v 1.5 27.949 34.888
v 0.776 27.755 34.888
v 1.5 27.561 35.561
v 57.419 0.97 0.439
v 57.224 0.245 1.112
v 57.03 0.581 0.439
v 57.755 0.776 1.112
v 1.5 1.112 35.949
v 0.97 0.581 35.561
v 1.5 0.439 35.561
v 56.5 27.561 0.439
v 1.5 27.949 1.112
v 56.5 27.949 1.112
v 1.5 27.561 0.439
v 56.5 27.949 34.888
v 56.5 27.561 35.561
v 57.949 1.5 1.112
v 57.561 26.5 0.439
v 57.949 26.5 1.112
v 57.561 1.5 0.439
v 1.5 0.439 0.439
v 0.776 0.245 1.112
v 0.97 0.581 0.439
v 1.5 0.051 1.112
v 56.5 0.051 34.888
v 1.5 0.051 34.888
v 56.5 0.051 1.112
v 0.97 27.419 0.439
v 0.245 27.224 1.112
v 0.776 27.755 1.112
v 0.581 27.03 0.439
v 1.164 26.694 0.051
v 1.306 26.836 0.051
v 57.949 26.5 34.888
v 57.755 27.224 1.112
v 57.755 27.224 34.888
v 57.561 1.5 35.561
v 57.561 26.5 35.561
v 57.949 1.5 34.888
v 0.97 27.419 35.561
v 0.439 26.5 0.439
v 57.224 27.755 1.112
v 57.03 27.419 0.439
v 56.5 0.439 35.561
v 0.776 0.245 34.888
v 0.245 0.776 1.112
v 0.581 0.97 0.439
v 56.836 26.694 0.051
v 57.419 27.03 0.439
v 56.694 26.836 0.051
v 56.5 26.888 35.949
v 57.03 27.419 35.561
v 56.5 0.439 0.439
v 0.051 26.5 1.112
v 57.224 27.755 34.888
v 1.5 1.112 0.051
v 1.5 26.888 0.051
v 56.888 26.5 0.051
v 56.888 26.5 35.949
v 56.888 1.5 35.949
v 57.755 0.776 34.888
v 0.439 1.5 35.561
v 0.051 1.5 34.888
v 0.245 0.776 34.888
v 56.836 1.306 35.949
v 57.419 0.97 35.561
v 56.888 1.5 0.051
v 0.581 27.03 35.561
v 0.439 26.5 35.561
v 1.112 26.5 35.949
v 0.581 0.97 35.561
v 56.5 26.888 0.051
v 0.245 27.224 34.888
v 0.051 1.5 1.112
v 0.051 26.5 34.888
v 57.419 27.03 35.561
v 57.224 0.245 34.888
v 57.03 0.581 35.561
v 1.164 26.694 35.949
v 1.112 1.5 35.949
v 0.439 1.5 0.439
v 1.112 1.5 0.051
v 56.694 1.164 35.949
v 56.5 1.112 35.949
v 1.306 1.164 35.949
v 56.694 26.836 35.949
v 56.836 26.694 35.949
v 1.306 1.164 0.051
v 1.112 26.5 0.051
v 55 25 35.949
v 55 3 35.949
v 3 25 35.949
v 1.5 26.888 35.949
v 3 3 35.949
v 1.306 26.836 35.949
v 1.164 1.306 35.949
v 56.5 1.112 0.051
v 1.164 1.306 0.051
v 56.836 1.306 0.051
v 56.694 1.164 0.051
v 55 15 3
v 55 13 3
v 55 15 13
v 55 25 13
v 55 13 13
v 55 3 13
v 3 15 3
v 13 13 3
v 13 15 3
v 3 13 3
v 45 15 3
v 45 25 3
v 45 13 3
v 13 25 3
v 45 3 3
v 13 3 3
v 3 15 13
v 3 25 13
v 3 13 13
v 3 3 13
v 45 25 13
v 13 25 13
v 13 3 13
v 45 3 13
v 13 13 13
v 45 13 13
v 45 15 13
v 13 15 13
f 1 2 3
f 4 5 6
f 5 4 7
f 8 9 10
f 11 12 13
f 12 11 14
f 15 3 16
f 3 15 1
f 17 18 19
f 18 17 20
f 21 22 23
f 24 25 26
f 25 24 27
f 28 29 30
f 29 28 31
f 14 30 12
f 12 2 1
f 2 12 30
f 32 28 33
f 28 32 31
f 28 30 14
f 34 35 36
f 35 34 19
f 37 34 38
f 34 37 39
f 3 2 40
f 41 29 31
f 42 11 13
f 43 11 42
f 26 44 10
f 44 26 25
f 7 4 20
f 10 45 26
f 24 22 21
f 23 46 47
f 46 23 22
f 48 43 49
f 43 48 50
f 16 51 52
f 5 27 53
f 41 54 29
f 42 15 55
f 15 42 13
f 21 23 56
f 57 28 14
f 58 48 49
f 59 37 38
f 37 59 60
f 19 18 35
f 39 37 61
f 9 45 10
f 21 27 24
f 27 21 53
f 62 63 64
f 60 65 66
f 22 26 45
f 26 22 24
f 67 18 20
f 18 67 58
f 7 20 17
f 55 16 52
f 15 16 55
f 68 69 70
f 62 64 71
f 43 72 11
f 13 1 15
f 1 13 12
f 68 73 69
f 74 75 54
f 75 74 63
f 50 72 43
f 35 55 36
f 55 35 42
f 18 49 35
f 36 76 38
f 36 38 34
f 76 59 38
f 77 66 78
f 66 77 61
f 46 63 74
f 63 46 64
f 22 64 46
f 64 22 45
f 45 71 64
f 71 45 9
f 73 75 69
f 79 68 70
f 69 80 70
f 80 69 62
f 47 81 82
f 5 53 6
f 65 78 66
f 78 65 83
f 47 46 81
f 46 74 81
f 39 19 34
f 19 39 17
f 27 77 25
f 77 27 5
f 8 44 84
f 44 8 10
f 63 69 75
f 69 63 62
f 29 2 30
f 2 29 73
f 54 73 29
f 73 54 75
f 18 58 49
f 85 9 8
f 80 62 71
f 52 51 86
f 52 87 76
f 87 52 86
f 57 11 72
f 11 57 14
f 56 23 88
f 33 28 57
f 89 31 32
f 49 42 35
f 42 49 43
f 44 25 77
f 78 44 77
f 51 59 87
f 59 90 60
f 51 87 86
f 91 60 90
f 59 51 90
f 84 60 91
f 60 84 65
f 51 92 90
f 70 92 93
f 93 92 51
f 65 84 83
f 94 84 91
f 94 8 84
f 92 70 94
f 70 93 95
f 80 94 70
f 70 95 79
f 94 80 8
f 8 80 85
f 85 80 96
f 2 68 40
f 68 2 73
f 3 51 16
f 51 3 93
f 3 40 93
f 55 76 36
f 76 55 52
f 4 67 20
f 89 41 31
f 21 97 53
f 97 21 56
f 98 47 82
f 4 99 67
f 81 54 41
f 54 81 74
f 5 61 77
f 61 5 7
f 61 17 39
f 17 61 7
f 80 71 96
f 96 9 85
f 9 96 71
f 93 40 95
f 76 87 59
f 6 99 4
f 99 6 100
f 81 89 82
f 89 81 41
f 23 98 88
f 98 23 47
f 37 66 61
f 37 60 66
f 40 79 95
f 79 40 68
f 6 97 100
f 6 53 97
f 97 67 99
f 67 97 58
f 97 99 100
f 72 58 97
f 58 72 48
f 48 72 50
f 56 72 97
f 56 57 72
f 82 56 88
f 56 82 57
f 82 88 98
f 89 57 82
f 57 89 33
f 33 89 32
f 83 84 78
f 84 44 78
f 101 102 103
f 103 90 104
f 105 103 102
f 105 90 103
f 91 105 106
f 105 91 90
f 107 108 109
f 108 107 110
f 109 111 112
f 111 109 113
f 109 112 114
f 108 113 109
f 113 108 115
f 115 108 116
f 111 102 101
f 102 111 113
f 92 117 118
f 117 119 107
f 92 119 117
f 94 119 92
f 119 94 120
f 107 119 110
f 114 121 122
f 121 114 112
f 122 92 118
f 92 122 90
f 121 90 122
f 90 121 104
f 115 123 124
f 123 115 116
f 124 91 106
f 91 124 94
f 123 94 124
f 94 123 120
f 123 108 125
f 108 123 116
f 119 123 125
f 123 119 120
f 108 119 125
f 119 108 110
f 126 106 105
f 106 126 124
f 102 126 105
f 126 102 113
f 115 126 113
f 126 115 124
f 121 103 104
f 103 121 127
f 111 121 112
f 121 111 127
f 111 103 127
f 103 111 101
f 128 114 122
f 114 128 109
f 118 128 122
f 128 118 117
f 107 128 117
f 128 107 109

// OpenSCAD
union() {
	difference() {
		minkowski() {
			translate(v = [1.5000000000, 1.5000000000, 1.5000000000]) {
				cube(size = [55.0000000000, 25.0000000000, 33.0000000000]);
			}
			sphere($fn = 12, r = 1.5000000000);
		}
		translate(v = [3, 3, 3]) {
			cube(size = [52.0000000000, 22.0000000000, 34.0000000000]);
		}
	}
	translate(v = [3, 3, 3]) {
		cube(size = [10, 10, 10]);
	}
	translate(v = [55.0000000000, 3, 3]) {
		scale(v = [-1, 1, 1]) {
			cube(size = [10, 10, 10]);
		}
	}
	translate(v = [55.0000000000, 25.0000000000, 3]) {
		scale(v = [1, -1, 1]) {
			scale(v = [-1, 1, 1]) {
				cube(size = [10, 10, 10]);
			}
		}
	}
	translate(v = [3, 25.0000000000, 3]) {
		scale(v = [1, -1, 1]) {
			cube(size = [10, 10, 10]);
		}
	}
}
